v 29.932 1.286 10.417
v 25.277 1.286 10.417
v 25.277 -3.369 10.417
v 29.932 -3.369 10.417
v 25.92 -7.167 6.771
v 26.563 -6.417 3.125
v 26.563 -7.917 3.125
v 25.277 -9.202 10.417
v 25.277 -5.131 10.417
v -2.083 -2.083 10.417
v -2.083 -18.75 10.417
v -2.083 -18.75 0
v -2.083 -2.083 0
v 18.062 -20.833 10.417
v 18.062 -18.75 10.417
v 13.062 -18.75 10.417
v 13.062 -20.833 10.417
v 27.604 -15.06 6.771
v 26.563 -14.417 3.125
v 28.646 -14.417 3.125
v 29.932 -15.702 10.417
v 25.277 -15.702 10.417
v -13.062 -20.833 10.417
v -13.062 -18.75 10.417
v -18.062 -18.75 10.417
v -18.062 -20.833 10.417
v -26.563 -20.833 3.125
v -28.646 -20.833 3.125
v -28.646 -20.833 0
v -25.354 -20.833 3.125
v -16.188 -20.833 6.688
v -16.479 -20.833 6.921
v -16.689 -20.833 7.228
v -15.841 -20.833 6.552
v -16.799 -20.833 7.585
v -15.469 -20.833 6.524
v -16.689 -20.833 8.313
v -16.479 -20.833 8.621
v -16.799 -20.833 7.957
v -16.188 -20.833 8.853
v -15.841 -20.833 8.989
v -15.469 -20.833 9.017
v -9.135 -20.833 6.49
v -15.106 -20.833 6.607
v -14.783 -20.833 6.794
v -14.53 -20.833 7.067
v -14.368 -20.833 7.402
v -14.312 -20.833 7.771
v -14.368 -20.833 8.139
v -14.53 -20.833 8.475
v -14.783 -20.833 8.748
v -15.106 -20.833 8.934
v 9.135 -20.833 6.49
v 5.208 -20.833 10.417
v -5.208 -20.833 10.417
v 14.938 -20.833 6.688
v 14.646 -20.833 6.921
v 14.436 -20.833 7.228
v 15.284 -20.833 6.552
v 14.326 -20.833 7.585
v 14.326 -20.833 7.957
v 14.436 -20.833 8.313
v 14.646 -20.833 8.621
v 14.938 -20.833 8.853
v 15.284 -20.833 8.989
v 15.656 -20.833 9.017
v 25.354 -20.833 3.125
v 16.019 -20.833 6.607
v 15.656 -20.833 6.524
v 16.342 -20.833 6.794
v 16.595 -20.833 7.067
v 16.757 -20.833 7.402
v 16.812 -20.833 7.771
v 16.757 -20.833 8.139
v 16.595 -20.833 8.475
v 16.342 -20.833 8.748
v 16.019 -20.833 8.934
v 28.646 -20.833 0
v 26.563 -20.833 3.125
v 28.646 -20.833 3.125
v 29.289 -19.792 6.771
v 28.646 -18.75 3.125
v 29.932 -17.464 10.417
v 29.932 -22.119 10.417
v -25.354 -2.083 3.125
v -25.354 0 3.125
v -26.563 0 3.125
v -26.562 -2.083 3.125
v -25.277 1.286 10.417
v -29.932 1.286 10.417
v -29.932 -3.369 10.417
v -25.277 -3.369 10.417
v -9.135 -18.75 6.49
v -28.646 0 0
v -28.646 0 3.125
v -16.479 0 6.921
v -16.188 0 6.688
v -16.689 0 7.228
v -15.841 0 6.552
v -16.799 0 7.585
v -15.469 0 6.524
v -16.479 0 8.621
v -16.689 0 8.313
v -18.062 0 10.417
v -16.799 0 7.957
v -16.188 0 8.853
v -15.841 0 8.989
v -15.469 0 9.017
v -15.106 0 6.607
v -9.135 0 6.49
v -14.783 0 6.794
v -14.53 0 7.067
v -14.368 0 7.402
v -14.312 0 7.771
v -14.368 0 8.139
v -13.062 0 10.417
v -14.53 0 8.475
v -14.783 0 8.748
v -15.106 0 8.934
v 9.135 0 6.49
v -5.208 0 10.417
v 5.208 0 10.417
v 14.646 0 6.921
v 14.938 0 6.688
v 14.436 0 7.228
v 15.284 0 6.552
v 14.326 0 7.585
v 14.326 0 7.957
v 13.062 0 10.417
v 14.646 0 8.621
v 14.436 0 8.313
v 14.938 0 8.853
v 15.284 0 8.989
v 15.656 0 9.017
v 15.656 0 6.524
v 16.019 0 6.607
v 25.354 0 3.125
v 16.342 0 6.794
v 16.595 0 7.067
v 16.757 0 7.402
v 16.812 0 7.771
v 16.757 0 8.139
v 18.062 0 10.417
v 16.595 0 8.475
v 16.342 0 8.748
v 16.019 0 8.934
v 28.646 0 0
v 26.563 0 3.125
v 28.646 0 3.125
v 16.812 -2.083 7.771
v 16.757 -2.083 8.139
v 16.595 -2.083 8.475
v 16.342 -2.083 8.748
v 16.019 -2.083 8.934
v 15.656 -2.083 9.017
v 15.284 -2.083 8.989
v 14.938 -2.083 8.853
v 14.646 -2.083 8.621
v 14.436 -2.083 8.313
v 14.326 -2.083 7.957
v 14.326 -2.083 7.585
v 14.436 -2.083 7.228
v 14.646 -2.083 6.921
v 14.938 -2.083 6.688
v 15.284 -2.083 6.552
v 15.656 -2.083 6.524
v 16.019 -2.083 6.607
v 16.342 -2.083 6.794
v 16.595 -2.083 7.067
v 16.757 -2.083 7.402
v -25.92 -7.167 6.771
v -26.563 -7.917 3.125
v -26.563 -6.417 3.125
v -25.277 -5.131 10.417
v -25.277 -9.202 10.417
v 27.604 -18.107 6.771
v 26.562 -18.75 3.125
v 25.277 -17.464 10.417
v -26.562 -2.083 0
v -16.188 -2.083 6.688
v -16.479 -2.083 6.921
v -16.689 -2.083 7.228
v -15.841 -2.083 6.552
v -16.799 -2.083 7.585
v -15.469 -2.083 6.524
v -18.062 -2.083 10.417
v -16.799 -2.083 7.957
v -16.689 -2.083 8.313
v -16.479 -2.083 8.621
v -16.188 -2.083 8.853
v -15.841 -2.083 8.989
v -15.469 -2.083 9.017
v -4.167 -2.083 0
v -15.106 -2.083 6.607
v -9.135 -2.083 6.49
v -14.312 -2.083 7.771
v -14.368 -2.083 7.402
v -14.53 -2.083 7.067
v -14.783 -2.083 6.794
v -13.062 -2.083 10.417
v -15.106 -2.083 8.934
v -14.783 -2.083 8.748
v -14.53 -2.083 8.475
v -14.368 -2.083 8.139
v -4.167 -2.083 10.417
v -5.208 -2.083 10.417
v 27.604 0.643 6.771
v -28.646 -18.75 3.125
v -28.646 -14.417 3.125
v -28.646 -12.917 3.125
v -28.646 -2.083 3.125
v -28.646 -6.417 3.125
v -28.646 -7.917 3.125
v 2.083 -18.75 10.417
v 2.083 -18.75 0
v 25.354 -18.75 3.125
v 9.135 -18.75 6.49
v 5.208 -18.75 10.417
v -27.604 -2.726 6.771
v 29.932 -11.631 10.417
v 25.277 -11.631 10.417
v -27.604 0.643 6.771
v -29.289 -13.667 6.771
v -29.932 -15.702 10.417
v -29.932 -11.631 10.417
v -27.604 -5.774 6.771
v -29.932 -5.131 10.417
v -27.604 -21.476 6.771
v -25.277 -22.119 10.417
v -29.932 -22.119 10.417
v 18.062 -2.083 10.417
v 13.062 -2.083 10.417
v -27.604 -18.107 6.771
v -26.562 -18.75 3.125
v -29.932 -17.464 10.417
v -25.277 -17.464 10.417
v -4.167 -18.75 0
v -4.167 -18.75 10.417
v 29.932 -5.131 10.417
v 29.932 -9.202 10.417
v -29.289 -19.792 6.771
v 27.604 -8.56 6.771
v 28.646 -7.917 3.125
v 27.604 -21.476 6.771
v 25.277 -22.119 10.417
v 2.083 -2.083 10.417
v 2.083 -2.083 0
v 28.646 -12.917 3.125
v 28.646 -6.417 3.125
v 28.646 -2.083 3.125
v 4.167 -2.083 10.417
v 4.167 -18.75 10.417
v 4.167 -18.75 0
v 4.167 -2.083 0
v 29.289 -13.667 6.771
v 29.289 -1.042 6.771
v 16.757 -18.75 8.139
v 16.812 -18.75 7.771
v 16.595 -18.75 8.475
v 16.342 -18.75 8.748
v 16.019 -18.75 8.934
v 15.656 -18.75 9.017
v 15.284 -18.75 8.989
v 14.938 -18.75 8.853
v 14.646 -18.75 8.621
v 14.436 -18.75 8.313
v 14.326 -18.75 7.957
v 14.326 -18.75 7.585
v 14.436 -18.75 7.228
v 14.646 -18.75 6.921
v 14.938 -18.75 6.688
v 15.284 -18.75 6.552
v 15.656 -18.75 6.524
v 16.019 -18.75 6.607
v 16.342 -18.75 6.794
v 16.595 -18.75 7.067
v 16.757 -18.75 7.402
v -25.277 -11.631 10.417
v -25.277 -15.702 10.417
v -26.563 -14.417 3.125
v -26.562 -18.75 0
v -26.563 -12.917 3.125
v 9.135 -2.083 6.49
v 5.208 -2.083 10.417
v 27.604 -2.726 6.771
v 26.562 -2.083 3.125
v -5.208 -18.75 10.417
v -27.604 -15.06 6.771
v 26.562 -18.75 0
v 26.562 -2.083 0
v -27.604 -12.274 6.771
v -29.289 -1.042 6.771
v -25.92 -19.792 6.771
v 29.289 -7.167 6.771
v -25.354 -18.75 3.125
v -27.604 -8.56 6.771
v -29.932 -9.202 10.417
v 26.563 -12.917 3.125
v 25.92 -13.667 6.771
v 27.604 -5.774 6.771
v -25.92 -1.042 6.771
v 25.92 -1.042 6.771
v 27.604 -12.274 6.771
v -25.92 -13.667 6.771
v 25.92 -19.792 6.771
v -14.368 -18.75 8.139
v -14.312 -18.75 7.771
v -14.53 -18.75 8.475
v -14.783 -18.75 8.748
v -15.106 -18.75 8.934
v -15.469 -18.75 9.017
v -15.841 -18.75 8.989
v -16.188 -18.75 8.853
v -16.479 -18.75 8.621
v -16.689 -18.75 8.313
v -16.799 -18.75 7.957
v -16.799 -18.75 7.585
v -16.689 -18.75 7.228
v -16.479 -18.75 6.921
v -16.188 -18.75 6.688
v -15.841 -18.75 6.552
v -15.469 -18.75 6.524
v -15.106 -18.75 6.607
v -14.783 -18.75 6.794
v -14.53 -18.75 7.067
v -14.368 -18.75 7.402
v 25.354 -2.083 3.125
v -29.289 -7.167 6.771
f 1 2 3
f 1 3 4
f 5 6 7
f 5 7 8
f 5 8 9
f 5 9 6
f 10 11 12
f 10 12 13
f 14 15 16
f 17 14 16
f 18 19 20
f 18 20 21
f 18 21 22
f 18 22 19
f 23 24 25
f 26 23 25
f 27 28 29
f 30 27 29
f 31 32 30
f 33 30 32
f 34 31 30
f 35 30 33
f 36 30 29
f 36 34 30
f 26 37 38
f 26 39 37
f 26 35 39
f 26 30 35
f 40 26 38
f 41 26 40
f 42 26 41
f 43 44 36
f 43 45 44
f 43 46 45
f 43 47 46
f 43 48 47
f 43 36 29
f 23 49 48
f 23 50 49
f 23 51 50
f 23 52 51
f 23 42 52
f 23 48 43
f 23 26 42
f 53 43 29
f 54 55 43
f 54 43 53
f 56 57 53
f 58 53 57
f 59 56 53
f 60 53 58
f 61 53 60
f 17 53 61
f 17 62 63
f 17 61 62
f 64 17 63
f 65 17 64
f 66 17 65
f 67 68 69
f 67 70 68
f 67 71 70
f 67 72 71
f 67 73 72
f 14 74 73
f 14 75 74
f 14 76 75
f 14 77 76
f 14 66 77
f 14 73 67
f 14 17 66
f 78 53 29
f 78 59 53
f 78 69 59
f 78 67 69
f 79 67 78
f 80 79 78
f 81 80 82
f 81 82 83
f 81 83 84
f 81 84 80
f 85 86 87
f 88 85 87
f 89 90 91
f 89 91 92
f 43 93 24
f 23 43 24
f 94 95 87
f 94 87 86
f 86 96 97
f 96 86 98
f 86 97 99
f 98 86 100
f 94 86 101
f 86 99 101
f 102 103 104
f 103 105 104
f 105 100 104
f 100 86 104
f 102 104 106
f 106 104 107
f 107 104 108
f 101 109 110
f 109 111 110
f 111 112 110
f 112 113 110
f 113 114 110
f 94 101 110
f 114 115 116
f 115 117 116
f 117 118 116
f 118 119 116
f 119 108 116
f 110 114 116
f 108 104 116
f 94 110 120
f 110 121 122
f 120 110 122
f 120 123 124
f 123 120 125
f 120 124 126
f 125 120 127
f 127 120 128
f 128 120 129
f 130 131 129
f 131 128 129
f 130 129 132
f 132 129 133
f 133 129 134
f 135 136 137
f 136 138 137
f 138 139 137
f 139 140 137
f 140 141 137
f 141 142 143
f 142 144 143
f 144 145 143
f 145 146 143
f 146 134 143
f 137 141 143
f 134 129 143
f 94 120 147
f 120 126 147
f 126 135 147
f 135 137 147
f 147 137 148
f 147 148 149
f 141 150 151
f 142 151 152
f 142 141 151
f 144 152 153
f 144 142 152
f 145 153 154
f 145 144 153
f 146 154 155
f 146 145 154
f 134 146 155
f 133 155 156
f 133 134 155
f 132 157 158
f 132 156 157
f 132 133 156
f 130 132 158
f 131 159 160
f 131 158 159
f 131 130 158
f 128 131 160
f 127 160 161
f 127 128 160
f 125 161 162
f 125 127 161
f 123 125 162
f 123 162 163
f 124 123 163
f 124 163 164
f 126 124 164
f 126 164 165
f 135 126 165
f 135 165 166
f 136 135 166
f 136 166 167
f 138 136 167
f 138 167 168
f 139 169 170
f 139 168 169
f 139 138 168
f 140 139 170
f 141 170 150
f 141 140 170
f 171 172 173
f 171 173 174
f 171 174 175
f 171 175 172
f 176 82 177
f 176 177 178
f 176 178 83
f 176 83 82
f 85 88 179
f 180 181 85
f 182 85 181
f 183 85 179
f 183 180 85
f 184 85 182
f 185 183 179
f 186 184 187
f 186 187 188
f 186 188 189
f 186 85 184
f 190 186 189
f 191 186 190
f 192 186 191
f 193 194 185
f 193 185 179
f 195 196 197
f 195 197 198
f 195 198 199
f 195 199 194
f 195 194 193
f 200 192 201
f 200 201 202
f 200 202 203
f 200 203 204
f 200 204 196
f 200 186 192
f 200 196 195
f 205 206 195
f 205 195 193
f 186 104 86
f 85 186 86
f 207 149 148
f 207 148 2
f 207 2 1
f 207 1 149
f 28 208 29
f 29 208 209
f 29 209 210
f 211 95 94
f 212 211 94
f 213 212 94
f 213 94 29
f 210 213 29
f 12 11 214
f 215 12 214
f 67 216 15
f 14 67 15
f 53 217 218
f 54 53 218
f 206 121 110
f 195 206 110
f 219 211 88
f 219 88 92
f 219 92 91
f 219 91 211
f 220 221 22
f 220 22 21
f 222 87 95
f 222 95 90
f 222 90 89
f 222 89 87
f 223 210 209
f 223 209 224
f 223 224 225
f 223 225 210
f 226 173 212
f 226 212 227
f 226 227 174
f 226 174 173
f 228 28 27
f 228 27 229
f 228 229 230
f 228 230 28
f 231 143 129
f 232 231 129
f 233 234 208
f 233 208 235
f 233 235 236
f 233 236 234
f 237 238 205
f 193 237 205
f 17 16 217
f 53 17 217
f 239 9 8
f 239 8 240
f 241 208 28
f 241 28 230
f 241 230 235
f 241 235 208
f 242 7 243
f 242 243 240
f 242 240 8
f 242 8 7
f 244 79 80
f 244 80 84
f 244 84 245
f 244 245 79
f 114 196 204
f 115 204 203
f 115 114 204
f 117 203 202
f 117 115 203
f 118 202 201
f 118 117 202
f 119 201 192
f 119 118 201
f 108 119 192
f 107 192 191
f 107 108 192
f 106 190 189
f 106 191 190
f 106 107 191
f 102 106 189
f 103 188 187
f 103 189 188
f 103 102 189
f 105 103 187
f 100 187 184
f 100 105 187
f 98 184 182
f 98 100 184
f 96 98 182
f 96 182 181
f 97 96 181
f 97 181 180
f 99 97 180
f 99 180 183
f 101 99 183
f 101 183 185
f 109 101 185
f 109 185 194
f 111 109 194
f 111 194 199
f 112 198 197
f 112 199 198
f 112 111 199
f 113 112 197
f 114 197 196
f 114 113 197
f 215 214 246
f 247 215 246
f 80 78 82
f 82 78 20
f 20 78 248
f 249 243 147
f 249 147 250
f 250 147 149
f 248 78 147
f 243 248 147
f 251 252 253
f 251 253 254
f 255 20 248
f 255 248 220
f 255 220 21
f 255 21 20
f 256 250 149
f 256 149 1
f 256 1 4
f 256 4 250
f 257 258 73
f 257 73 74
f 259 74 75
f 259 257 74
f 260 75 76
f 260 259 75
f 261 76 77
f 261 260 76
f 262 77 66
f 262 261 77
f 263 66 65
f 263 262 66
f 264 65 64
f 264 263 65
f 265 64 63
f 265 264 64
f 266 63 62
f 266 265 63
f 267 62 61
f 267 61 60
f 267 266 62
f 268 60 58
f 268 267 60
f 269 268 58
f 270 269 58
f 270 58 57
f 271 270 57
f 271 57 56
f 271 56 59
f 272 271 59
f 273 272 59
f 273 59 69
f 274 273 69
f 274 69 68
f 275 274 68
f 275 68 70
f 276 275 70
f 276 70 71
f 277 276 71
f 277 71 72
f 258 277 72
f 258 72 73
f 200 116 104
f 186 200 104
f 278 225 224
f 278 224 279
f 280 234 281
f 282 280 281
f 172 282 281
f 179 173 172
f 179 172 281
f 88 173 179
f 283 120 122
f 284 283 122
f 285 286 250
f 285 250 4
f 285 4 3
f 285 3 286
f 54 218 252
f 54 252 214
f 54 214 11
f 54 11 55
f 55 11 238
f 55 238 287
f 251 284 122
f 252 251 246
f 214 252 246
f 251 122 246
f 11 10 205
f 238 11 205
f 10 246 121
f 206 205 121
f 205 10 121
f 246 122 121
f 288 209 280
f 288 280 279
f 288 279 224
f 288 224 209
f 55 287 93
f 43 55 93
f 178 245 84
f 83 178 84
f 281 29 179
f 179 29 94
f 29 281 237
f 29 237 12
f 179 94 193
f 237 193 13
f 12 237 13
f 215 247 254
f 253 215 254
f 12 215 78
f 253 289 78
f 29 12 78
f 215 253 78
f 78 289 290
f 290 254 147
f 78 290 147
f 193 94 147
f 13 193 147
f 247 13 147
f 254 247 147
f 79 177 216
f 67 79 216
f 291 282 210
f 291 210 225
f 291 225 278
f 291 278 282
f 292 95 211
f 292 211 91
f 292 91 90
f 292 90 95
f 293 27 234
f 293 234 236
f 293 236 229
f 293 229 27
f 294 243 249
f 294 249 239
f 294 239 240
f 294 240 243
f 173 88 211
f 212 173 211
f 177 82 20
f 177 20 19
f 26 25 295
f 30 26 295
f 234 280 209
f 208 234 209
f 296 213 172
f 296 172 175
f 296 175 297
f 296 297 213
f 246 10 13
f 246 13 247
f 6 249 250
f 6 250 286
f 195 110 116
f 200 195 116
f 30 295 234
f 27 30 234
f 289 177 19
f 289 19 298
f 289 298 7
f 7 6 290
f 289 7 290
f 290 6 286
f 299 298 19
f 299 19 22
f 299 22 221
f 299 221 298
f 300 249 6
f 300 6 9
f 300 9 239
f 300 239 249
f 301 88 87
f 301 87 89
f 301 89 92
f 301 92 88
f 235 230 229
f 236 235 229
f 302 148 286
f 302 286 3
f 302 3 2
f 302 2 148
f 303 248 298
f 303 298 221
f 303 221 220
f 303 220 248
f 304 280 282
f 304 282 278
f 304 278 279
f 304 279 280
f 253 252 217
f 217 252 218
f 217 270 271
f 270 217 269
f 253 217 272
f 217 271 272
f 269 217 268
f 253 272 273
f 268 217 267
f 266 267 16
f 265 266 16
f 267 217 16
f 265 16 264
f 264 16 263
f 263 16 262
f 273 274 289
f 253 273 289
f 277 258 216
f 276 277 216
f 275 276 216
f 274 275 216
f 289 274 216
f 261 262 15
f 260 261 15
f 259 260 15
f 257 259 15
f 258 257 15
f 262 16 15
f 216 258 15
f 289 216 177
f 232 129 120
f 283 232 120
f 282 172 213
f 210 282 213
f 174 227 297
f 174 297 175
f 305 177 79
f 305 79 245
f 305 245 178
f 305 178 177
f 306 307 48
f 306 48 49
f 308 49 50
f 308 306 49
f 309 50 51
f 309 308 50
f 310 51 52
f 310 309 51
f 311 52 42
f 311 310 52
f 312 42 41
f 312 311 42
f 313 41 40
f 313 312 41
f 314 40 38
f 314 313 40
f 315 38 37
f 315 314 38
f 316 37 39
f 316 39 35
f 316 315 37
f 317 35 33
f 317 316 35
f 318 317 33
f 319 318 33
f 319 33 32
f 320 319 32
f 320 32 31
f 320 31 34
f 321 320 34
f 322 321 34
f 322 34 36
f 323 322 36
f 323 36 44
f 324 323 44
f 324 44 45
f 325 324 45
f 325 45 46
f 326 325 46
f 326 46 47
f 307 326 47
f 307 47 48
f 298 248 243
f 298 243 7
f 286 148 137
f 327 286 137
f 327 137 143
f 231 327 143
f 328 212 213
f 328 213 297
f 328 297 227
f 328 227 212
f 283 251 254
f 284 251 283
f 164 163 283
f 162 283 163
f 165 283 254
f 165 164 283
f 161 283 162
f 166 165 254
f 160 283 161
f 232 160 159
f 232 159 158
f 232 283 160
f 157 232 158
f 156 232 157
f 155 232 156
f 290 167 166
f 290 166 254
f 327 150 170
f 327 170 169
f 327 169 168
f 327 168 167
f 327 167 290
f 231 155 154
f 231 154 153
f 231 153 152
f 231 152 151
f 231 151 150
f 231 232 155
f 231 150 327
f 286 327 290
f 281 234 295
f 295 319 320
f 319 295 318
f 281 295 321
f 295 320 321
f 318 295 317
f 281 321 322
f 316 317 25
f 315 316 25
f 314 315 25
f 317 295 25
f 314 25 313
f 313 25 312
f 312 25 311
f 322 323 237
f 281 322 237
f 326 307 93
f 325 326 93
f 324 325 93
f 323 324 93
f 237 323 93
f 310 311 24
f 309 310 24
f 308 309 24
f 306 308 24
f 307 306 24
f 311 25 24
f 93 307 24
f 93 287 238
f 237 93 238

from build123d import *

# Parameters (mm, degrees)
F0_R     = 1.25
F1_DEPTH = 20.8333333333
F2_W     = 22.3958333333
F2_H     = 16.6666666667
F2_W_2   = 4.1666666667
F3_DEPTH = 10.4176666667
F5_W     = 2.0833333333
F5_H     = 2.0833333333
F5_H_2   = 1.5
F6_DEPTH = 7.2916666667
F6_TAPER = -10


with BuildPart() as f1:
    # F0 (on Front) → F1 (new body)
    with BuildSketch(Plane.XZ):
        Polygon((-28.6458333333, 0), (0, 0), (28.6458333333, 0), (28.6458333333, 3.125), (25.3541666667, 3.125), (18.0625, 10.4166666667), (13.0625, 10.4166666667), (9.1354166667, 6.4895833333), (5.2083333333, 10.4166666667), (0, 10.4166666667), (-5.2083333333, 10.4166666667), (-9.1354166667, 6.4895833333), (-13.0625, 10.4166666667), (-18.0625, 10.4166666667), (-25.3541666667, 3.125), (-28.6458333333, 3.125), align=None)
        with Locations((-15.5625, 7.7708333333)):
            Circle(F0_R, mode=Mode.SUBTRACT)
        with Locations((15.5625, 7.7708333333)):
            Circle(F0_R, mode=Mode.SUBTRACT)
    extrude(amount=F1_DEPTH)

    # F2 (on face) → F3 (cut, through all)
    with BuildSketch(Plane.XY.offset(10.4166666667)):
        with Locations((-15.3645833333, -10.4166666667)):
            Rectangle(F2_W, F2_H)
        with Locations((15.3645833333, -10.4166666667)):
            Rectangle(F2_W, F2_H)
        with Locations((0, -10.4166666667)):
            Rectangle(F2_W_2, F2_H)
    extrude(amount=-F3_DEPTH, mode=Mode.SUBTRACT)

    # F5 (on offset) → F6 (join, through all)
    with BuildSketch(Plane.XY.offset(3.125)):
        with Locations((-27.6041666667, -1.0416666667)):
            Rectangle(F5_W, F5_H)
        with Locations((-27.6041666667, -19.7916666667)):
            Rectangle(F5_W, F5_H)
        with Locations((27.6041666667, -1.0416666667)):
            Rectangle(F5_W, F5_H)
        with Locations((27.6041666667, -19.7916666667)):
            Rectangle(F5_W, F5_H)
        with Locations((27.6041666667, -7.1666666667)):
            Rectangle(F5_W, F5_H_2)
        with Locations((27.6041666667, -13.6666666667)):
            Rectangle(F5_W, F5_H_2)
        with Locations((-27.6041666667, -7.1666666667)):
            Rectangle(F5_W, F5_H_2)
        with Locations((-27.6041666667, -13.6666666667)):
            Rectangle(F5_W, F5_H_2)
    extrude(amount=F6_DEPTH, taper=F6_TAPER)


solid = f1.part
